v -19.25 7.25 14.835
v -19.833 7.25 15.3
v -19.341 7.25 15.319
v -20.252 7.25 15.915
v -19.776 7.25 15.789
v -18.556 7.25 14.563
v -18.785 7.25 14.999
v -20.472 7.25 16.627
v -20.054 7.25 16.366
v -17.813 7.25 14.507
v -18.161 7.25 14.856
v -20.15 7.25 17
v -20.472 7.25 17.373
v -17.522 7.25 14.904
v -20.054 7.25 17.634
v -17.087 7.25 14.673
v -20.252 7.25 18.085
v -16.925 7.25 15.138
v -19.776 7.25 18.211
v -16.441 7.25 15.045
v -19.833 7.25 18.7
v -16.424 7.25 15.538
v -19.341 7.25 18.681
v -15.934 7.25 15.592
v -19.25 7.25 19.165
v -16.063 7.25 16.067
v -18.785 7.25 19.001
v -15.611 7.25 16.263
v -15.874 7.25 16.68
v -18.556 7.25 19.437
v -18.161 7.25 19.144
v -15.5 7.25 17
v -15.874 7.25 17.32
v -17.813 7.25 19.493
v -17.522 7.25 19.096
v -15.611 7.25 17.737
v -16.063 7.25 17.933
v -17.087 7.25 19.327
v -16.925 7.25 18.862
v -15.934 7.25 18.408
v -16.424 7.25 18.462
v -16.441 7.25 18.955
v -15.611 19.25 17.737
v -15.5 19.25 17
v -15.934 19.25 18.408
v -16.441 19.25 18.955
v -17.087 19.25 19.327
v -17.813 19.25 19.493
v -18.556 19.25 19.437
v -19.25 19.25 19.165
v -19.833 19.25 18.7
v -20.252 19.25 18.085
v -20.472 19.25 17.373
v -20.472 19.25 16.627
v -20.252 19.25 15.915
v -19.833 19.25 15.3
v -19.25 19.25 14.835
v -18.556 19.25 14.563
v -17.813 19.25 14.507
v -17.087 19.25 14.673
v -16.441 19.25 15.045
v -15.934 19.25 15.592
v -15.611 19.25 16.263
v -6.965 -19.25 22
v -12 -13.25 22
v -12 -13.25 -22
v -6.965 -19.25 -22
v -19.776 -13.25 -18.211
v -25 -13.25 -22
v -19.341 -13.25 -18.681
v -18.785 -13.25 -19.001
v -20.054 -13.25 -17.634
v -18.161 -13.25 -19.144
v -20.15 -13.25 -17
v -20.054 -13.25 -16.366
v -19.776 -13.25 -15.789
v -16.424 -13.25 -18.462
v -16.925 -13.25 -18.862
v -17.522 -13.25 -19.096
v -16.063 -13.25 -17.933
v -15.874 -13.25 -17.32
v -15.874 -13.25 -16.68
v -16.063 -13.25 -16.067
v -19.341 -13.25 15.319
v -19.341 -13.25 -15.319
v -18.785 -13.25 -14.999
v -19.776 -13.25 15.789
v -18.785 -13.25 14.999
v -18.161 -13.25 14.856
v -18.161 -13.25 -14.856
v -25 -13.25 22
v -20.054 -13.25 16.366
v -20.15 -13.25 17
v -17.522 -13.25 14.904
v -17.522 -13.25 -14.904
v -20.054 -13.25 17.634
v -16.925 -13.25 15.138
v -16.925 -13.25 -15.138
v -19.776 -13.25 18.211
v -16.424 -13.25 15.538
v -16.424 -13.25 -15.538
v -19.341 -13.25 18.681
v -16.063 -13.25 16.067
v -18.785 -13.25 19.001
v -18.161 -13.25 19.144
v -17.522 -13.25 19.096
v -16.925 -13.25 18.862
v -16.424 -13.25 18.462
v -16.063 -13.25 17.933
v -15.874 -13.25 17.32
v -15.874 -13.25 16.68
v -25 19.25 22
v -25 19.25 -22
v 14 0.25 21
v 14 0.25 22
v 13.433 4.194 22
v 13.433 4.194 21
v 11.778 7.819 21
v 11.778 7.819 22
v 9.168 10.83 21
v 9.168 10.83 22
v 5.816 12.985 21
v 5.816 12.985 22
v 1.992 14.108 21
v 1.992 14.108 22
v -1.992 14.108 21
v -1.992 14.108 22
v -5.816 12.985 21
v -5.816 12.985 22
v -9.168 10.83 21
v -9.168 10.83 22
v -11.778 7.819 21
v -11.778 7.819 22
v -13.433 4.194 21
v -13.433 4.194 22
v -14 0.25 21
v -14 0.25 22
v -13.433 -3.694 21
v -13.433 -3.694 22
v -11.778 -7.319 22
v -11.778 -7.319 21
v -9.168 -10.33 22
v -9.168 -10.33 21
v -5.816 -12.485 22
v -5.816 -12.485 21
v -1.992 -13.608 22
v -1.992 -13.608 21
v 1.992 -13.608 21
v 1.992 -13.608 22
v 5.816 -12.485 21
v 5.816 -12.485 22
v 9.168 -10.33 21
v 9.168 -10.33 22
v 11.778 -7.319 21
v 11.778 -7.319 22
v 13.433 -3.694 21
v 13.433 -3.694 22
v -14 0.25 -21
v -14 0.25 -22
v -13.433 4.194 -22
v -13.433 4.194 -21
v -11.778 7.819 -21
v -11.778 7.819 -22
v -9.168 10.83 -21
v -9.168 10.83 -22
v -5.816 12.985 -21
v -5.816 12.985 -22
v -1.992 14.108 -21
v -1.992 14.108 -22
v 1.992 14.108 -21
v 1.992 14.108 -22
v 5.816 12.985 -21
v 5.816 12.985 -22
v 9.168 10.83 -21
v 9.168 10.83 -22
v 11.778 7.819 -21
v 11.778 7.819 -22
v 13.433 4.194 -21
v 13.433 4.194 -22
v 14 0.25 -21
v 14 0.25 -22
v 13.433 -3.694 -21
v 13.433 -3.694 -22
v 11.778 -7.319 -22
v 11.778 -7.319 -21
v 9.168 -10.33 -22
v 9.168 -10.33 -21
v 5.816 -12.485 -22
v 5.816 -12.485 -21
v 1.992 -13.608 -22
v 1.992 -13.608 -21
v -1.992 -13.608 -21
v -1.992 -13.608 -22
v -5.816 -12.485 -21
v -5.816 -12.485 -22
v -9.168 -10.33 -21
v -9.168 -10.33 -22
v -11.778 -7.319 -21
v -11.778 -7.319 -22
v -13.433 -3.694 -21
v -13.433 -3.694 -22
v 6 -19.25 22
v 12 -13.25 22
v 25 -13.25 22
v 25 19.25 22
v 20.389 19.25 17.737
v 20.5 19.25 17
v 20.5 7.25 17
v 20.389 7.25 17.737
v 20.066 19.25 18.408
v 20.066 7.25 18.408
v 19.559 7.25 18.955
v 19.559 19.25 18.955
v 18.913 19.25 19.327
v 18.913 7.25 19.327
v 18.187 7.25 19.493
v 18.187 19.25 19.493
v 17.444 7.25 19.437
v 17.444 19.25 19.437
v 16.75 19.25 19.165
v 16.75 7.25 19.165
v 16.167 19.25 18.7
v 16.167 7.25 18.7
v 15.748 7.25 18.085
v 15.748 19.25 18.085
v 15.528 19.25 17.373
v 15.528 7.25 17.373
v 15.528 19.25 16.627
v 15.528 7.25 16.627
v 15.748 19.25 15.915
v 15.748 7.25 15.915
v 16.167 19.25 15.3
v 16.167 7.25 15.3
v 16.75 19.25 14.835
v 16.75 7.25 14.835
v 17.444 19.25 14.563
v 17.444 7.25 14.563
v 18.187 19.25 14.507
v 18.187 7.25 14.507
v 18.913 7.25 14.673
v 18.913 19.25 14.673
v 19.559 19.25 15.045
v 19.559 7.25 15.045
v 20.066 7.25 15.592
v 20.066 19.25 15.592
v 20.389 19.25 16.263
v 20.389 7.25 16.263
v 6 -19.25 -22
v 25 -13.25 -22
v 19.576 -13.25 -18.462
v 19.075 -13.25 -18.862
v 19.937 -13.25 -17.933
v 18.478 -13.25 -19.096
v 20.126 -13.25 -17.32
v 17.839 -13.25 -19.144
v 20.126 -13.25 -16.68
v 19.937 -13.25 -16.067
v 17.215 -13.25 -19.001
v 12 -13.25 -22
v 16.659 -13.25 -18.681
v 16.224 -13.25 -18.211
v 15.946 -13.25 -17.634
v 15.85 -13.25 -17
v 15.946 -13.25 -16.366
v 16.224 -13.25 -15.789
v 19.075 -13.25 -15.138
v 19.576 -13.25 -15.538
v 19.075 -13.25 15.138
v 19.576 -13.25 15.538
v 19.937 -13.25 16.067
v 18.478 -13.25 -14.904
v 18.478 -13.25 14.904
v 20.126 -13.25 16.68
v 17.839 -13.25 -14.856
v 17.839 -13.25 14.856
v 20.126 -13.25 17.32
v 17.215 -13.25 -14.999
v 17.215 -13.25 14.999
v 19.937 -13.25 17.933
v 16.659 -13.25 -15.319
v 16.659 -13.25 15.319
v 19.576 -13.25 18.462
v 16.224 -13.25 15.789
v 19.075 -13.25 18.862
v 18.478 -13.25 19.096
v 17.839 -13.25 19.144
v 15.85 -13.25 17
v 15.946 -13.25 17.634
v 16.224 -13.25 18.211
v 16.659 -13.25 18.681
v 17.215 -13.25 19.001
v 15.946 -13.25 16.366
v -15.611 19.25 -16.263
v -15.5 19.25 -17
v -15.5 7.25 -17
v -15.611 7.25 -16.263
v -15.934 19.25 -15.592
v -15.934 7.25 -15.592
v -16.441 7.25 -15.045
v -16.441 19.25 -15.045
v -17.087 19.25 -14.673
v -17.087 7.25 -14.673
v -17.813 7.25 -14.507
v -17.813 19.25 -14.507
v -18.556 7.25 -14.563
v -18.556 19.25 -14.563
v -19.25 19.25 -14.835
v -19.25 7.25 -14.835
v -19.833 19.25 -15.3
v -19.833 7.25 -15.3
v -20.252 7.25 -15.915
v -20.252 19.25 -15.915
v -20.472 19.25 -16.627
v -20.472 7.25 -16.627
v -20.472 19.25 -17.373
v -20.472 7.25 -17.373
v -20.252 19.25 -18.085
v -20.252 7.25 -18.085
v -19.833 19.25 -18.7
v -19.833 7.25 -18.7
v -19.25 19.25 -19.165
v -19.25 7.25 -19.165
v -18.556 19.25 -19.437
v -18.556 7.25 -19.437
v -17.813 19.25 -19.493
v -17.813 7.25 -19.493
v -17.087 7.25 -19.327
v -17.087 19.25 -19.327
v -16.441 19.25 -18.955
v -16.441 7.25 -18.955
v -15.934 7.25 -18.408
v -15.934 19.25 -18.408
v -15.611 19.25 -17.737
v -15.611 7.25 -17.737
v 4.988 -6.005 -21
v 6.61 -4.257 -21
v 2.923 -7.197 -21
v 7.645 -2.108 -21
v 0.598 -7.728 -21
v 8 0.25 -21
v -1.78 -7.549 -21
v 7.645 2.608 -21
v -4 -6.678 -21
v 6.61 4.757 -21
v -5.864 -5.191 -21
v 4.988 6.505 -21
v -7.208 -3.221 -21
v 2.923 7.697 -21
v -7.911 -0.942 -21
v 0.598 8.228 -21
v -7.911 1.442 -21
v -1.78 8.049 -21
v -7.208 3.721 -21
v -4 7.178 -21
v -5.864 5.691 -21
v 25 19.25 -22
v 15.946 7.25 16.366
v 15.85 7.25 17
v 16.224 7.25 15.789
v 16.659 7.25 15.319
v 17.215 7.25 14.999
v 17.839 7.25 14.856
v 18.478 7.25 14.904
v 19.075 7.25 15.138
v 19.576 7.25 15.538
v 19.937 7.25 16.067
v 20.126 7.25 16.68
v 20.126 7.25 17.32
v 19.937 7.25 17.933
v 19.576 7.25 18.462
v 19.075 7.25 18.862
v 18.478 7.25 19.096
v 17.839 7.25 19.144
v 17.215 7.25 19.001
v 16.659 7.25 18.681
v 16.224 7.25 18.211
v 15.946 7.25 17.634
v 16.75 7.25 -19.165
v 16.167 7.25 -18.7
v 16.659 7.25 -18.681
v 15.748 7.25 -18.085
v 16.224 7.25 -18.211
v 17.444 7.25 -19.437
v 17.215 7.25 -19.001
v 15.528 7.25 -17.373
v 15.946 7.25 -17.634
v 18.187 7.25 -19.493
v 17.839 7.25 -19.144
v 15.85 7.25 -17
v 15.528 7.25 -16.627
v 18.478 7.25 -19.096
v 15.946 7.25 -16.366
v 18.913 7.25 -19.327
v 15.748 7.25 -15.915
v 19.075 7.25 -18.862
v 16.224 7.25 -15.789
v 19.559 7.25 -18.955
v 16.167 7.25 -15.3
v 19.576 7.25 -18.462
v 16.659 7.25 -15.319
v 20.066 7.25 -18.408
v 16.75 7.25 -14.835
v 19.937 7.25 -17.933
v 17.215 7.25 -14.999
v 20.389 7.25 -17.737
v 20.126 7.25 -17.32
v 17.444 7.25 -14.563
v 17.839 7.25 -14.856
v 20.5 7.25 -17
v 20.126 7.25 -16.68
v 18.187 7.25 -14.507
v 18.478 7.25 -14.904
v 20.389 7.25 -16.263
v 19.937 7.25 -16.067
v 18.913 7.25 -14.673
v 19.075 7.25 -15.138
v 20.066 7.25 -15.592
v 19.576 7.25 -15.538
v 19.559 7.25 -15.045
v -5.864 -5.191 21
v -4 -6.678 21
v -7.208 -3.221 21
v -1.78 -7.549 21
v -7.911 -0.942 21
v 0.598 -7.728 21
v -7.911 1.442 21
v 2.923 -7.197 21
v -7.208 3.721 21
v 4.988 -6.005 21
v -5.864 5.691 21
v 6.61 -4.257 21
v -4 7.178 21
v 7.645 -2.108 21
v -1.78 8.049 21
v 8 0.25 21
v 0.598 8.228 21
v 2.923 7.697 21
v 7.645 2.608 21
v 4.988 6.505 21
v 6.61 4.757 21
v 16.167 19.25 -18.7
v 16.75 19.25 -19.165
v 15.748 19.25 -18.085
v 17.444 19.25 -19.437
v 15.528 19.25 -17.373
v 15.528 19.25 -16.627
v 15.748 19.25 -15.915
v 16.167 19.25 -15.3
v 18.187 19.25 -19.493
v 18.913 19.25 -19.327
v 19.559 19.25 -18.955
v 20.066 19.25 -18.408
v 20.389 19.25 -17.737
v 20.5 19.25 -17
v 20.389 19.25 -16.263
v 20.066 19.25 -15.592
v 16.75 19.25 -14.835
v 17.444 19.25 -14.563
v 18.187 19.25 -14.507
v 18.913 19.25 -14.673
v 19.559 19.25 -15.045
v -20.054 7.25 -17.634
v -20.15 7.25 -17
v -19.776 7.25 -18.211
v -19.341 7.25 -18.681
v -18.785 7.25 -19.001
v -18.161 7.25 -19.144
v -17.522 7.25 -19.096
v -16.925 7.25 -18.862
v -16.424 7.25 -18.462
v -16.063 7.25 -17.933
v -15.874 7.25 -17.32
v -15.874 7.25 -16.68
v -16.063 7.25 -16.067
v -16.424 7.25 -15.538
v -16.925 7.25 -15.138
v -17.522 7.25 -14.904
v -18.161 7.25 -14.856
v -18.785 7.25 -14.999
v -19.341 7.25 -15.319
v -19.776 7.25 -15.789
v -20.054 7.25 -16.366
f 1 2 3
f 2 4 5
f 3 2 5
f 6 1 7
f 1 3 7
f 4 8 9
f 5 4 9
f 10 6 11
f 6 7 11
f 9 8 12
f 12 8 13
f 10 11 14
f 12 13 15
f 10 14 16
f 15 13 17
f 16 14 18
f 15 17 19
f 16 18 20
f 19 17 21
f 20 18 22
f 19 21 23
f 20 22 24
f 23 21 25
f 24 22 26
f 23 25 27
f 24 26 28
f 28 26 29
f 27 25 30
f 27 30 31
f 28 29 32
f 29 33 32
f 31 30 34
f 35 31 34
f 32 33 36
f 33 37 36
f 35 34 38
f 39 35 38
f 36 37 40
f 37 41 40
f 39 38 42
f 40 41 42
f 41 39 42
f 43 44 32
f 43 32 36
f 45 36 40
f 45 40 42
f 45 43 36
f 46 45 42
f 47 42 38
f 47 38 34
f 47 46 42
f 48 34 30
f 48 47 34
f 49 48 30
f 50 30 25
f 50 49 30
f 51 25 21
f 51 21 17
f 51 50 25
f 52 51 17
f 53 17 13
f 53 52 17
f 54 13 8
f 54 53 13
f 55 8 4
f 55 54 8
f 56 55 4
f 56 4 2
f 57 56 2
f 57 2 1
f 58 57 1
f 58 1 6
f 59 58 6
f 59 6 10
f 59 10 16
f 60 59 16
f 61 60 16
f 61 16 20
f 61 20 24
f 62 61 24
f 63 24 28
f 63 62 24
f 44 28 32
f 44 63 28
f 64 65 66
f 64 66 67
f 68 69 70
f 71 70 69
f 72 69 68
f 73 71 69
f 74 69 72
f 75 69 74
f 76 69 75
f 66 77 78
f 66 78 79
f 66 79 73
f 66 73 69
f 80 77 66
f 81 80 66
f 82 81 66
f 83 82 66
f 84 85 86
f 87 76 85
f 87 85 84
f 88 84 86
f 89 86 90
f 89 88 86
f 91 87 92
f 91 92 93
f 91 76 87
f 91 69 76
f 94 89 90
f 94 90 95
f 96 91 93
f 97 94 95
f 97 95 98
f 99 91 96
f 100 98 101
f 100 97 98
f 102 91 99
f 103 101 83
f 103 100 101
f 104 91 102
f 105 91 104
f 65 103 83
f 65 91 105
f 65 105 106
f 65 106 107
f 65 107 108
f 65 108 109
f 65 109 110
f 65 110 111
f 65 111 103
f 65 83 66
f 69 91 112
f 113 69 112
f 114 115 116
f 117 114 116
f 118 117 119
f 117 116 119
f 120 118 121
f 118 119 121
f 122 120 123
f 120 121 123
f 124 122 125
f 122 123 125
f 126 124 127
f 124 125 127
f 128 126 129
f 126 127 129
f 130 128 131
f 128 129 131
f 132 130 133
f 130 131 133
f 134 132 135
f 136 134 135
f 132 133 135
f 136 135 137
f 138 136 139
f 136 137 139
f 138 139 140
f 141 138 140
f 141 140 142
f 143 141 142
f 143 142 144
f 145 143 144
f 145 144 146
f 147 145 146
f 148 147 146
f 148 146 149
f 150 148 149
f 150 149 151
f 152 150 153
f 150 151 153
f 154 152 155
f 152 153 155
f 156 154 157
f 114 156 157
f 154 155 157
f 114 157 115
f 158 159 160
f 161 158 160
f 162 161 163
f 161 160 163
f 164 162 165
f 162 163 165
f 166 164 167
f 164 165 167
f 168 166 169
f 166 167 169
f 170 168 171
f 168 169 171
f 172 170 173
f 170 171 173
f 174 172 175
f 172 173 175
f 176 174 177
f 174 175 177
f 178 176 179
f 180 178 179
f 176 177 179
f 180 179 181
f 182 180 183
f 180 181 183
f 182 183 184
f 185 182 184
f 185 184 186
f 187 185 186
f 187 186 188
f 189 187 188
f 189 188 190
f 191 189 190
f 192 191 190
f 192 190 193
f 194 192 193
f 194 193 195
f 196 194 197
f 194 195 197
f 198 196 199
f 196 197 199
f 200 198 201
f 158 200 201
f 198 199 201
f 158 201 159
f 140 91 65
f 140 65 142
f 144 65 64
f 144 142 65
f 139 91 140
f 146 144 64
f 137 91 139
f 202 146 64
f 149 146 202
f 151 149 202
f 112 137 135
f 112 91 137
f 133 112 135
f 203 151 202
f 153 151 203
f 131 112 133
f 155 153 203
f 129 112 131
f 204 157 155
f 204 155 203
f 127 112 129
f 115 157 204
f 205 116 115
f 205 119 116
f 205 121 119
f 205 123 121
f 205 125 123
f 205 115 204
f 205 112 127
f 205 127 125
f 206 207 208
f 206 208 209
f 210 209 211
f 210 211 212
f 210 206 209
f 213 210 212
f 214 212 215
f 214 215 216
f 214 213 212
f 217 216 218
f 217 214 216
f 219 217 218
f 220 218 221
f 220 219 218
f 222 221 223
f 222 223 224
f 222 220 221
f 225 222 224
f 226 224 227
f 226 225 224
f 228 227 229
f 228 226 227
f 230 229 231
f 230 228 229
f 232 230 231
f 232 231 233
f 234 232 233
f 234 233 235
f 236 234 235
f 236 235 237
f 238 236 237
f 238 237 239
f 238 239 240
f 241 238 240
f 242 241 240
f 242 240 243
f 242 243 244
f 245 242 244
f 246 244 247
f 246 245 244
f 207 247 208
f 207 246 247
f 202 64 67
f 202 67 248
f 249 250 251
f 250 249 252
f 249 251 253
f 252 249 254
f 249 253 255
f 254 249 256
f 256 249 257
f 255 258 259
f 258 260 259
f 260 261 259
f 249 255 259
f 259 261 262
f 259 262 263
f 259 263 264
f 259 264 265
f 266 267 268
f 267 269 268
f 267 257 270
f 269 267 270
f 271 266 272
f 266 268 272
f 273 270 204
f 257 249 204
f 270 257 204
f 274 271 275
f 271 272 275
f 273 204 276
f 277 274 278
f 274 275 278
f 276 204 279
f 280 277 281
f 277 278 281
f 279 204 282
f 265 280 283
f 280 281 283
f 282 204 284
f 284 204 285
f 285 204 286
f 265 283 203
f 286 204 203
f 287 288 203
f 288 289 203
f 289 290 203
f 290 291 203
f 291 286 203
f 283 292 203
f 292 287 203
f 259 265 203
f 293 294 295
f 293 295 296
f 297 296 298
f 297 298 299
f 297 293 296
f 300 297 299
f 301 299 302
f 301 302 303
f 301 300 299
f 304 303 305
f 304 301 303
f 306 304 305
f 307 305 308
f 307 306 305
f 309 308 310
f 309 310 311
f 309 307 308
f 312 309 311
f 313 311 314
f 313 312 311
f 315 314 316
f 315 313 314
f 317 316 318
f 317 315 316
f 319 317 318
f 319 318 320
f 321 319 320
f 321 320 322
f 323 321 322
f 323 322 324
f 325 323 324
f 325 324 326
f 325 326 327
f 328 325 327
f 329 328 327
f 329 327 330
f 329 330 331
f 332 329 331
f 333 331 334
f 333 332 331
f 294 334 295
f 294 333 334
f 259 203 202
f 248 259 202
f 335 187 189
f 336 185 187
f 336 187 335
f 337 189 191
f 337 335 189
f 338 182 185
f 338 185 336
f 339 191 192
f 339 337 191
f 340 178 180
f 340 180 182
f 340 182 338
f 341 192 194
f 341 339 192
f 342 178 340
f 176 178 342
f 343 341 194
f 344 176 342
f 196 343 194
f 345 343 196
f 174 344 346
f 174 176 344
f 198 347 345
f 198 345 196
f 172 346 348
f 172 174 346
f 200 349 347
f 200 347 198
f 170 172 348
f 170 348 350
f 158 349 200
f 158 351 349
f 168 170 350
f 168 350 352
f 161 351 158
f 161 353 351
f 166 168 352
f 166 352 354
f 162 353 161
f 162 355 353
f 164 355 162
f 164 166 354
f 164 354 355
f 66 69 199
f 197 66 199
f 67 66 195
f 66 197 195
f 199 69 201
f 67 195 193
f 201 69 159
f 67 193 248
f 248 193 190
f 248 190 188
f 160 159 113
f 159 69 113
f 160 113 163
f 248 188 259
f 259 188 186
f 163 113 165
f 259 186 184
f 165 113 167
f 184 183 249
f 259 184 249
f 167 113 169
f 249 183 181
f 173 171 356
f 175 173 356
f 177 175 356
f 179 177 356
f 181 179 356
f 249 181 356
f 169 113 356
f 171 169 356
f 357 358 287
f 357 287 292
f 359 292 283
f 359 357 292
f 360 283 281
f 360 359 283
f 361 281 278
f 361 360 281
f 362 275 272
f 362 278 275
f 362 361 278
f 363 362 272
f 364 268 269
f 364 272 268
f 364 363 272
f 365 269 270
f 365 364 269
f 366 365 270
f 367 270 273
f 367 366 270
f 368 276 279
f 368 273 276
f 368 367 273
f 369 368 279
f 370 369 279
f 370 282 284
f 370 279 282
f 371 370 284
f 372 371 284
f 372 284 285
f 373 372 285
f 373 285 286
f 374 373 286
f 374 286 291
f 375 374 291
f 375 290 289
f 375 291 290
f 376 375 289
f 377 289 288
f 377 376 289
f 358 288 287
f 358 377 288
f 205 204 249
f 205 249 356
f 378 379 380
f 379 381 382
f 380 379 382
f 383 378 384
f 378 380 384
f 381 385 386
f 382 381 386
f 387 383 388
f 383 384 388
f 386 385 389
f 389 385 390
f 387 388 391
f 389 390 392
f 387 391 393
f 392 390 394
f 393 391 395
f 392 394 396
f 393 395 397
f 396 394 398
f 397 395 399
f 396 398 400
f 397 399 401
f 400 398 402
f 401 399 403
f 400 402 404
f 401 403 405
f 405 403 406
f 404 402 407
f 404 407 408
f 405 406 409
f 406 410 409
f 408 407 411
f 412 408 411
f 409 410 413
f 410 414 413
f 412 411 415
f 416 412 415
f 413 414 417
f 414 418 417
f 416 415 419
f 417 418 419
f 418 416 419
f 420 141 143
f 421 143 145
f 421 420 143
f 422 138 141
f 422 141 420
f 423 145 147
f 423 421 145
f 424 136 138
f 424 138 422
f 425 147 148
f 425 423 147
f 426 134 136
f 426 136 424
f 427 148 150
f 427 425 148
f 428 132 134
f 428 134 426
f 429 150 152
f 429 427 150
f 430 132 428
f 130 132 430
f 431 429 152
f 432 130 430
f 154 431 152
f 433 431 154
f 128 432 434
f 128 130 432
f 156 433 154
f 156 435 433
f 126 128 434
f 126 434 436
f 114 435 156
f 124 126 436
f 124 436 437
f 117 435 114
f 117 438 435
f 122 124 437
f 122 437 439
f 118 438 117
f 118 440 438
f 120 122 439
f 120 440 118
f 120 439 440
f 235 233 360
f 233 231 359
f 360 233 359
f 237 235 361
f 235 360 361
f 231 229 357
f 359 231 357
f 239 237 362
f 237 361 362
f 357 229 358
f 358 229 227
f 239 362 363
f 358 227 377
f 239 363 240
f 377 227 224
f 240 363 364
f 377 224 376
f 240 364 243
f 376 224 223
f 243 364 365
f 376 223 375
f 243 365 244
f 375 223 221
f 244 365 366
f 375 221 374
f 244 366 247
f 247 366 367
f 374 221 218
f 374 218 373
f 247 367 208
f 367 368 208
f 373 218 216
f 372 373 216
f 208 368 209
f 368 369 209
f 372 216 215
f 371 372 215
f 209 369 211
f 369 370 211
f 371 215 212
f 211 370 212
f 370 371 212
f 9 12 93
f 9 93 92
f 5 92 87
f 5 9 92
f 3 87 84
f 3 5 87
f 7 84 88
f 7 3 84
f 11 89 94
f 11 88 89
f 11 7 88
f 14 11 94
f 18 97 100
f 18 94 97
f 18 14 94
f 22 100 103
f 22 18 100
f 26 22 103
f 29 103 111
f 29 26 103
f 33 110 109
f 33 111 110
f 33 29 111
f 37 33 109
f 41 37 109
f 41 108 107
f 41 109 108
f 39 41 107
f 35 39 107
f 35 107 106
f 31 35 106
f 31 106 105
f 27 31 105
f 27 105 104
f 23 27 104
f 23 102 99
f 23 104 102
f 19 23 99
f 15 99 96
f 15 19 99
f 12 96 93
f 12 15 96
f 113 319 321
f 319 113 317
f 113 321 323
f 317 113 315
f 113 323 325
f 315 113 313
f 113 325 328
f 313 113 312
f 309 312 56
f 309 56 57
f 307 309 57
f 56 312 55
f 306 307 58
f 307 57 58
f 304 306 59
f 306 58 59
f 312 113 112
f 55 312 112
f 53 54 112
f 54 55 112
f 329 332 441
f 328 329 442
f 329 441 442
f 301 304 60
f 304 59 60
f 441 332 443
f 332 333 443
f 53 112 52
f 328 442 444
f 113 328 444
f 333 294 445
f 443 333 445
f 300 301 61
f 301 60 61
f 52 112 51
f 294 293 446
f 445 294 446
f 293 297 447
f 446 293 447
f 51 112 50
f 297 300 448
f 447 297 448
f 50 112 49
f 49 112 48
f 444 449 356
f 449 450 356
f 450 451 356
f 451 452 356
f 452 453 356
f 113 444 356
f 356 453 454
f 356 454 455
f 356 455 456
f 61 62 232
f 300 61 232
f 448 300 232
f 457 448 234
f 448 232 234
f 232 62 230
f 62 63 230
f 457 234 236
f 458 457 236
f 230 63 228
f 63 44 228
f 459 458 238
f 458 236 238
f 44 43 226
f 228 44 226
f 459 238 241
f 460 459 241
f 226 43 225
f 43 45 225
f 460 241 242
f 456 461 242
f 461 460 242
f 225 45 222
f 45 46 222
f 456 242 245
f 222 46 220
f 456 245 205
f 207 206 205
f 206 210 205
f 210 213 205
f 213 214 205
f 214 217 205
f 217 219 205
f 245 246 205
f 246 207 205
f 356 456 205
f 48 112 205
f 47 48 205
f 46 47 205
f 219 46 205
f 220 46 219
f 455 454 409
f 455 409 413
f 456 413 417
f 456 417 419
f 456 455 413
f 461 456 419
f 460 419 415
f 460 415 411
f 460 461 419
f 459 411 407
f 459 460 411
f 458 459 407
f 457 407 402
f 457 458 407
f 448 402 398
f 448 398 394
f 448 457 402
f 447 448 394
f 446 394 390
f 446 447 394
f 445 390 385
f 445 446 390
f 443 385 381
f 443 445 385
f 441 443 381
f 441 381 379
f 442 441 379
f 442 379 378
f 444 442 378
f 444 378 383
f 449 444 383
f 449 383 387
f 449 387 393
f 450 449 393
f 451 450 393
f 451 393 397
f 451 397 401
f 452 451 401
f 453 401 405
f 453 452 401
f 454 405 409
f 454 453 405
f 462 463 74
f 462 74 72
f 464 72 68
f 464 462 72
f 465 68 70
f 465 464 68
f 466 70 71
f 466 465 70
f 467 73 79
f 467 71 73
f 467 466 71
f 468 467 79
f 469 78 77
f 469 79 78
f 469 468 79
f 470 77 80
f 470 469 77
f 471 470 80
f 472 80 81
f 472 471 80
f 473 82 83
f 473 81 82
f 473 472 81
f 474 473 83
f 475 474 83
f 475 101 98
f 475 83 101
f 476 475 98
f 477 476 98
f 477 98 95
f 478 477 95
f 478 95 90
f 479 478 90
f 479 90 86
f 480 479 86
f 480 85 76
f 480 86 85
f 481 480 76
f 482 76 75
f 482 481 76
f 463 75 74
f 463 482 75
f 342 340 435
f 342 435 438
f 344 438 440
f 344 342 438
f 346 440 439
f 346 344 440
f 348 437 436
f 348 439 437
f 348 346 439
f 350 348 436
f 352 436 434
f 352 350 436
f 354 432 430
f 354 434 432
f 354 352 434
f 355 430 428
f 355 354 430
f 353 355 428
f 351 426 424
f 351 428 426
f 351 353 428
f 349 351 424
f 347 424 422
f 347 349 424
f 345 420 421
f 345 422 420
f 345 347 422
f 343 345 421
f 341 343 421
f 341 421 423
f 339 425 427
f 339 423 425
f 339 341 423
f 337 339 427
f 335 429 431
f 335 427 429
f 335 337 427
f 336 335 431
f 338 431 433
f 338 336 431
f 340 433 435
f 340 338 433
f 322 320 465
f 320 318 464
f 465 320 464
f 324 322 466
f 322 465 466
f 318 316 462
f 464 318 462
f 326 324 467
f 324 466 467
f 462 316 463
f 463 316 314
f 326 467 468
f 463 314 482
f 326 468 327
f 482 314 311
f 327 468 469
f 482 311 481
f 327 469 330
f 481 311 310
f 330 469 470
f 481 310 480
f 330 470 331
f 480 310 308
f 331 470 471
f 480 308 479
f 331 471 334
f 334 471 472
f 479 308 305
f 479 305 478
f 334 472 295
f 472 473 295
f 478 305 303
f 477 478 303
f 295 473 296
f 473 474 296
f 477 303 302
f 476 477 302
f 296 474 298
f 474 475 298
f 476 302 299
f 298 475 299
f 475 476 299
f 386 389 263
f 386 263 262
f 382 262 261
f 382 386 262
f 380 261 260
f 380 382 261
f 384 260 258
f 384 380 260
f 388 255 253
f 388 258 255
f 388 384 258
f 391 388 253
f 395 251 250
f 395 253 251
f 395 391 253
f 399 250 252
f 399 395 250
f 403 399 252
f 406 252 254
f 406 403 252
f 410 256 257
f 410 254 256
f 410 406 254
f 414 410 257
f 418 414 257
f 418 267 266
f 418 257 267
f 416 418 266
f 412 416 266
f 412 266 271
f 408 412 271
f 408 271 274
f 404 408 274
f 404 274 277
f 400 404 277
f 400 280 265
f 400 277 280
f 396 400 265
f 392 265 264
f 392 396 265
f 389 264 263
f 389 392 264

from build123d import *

# Parameters (mm, degrees)
SKETCH1_W           = 50
SKETCH1_H           = 38.5
SKETCH1_R           = 8
BOSS_EXTRUDE1_DEPTH = 22
CUT_EXTRUDE5_DEPTH  = 45
SKETCH2_R           = 2.15
CUT_EXTRUDE1_DEPTH  = 39.5
SKETCH3_R           = 2.5
CUT_EXTRUDE2_DEPTH  = 12
SKETCH4_R           = 14
CUT_EXTRUDE3_DEPTH  = 1
SKETCH5_R           = 14
CUT_EXTRUDE4_DEPTH  = 1


with BuildPart() as part:
    # Sketch1 → Boss-Extrude1 (new body, symmetric)
    with BuildSketch(Plane.XY):
        Rectangle(SKETCH1_W, SKETCH1_H)
        with Locations((0, 0.25)):
            Circle(SKETCH1_R, mode=Mode.SUBTRACT)
    extrude(amount=BOSS_EXTRUDE1_DEPTH, both=True)

    # Sketch6 → Cut-Extrude5 (cut, through all)
    with BuildSketch(Plane.XY.offset(22)):
        Polygon((-25, -13.25), (-12, -13.25), (-6.965402213, -19.25), (-25, -19.25), align=None)
        Polygon((25, -13.25), (12, -13.25), (6, -19.25), (25, -19.25), align=None)
    extrude(amount=-CUT_EXTRUDE5_DEPTH, mode=Mode.SUBTRACT)

    # Sketch2 → Cut-Extrude1 (cut, through all)
    with BuildSketch(Plane(origin=(0, 19.25, 0), x_dir=(-1, 0, 0), z_dir=(0, -1, 0))):
        with Locations((18, -17)):
            Circle(SKETCH2_R)
        with Locations((-18, -17)):
            Circle(SKETCH2_R)
        with Locations((-18, 17)):
            Circle(SKETCH2_R)
        with Locations((18, 17)):
            Circle(SKETCH2_R)
    extrude(amount=CUT_EXTRUDE1_DEPTH, mode=Mode.SUBTRACT)

    # Sketch3 → Cut-Extrude2 (cut)
    with BuildSketch(Plane.XZ.offset(-19.25)):
        with Locations((-18, 17)):
            Circle(SKETCH3_R)
        with Locations((18, 17)):
            Circle(SKETCH3_R)
        with Locations((18, -17)):
            Circle(SKETCH3_R)
        with Locations((-18, -17)):
            Circle(SKETCH3_R)
    extrude(amount=CUT_EXTRUDE2_DEPTH, mode=Mode.SUBTRACT)

    # Sketch4 → Cut-Extrude3 (cut)
    with BuildSketch(Plane.XY.offset(22)):
        with Locations((0, 0.25)):
            Circle(SKETCH4_R)
    extrude(amount=-CUT_EXTRUDE3_DEPTH, mode=Mode.SUBTRACT)

    # Sketch5 → Cut-Extrude4 (cut)
    with BuildSketch(Plane(origin=(0, 0, -22), x_dir=(-1, 0, 0), z_dir=(0, 0, -1))):
        with Locations((0, 0.25)):
            Circle(SKETCH5_R)
    extrude(amount=-CUT_EXTRUDE4_DEPTH, mode=Mode.SUBTRACT)


solid = part.part
